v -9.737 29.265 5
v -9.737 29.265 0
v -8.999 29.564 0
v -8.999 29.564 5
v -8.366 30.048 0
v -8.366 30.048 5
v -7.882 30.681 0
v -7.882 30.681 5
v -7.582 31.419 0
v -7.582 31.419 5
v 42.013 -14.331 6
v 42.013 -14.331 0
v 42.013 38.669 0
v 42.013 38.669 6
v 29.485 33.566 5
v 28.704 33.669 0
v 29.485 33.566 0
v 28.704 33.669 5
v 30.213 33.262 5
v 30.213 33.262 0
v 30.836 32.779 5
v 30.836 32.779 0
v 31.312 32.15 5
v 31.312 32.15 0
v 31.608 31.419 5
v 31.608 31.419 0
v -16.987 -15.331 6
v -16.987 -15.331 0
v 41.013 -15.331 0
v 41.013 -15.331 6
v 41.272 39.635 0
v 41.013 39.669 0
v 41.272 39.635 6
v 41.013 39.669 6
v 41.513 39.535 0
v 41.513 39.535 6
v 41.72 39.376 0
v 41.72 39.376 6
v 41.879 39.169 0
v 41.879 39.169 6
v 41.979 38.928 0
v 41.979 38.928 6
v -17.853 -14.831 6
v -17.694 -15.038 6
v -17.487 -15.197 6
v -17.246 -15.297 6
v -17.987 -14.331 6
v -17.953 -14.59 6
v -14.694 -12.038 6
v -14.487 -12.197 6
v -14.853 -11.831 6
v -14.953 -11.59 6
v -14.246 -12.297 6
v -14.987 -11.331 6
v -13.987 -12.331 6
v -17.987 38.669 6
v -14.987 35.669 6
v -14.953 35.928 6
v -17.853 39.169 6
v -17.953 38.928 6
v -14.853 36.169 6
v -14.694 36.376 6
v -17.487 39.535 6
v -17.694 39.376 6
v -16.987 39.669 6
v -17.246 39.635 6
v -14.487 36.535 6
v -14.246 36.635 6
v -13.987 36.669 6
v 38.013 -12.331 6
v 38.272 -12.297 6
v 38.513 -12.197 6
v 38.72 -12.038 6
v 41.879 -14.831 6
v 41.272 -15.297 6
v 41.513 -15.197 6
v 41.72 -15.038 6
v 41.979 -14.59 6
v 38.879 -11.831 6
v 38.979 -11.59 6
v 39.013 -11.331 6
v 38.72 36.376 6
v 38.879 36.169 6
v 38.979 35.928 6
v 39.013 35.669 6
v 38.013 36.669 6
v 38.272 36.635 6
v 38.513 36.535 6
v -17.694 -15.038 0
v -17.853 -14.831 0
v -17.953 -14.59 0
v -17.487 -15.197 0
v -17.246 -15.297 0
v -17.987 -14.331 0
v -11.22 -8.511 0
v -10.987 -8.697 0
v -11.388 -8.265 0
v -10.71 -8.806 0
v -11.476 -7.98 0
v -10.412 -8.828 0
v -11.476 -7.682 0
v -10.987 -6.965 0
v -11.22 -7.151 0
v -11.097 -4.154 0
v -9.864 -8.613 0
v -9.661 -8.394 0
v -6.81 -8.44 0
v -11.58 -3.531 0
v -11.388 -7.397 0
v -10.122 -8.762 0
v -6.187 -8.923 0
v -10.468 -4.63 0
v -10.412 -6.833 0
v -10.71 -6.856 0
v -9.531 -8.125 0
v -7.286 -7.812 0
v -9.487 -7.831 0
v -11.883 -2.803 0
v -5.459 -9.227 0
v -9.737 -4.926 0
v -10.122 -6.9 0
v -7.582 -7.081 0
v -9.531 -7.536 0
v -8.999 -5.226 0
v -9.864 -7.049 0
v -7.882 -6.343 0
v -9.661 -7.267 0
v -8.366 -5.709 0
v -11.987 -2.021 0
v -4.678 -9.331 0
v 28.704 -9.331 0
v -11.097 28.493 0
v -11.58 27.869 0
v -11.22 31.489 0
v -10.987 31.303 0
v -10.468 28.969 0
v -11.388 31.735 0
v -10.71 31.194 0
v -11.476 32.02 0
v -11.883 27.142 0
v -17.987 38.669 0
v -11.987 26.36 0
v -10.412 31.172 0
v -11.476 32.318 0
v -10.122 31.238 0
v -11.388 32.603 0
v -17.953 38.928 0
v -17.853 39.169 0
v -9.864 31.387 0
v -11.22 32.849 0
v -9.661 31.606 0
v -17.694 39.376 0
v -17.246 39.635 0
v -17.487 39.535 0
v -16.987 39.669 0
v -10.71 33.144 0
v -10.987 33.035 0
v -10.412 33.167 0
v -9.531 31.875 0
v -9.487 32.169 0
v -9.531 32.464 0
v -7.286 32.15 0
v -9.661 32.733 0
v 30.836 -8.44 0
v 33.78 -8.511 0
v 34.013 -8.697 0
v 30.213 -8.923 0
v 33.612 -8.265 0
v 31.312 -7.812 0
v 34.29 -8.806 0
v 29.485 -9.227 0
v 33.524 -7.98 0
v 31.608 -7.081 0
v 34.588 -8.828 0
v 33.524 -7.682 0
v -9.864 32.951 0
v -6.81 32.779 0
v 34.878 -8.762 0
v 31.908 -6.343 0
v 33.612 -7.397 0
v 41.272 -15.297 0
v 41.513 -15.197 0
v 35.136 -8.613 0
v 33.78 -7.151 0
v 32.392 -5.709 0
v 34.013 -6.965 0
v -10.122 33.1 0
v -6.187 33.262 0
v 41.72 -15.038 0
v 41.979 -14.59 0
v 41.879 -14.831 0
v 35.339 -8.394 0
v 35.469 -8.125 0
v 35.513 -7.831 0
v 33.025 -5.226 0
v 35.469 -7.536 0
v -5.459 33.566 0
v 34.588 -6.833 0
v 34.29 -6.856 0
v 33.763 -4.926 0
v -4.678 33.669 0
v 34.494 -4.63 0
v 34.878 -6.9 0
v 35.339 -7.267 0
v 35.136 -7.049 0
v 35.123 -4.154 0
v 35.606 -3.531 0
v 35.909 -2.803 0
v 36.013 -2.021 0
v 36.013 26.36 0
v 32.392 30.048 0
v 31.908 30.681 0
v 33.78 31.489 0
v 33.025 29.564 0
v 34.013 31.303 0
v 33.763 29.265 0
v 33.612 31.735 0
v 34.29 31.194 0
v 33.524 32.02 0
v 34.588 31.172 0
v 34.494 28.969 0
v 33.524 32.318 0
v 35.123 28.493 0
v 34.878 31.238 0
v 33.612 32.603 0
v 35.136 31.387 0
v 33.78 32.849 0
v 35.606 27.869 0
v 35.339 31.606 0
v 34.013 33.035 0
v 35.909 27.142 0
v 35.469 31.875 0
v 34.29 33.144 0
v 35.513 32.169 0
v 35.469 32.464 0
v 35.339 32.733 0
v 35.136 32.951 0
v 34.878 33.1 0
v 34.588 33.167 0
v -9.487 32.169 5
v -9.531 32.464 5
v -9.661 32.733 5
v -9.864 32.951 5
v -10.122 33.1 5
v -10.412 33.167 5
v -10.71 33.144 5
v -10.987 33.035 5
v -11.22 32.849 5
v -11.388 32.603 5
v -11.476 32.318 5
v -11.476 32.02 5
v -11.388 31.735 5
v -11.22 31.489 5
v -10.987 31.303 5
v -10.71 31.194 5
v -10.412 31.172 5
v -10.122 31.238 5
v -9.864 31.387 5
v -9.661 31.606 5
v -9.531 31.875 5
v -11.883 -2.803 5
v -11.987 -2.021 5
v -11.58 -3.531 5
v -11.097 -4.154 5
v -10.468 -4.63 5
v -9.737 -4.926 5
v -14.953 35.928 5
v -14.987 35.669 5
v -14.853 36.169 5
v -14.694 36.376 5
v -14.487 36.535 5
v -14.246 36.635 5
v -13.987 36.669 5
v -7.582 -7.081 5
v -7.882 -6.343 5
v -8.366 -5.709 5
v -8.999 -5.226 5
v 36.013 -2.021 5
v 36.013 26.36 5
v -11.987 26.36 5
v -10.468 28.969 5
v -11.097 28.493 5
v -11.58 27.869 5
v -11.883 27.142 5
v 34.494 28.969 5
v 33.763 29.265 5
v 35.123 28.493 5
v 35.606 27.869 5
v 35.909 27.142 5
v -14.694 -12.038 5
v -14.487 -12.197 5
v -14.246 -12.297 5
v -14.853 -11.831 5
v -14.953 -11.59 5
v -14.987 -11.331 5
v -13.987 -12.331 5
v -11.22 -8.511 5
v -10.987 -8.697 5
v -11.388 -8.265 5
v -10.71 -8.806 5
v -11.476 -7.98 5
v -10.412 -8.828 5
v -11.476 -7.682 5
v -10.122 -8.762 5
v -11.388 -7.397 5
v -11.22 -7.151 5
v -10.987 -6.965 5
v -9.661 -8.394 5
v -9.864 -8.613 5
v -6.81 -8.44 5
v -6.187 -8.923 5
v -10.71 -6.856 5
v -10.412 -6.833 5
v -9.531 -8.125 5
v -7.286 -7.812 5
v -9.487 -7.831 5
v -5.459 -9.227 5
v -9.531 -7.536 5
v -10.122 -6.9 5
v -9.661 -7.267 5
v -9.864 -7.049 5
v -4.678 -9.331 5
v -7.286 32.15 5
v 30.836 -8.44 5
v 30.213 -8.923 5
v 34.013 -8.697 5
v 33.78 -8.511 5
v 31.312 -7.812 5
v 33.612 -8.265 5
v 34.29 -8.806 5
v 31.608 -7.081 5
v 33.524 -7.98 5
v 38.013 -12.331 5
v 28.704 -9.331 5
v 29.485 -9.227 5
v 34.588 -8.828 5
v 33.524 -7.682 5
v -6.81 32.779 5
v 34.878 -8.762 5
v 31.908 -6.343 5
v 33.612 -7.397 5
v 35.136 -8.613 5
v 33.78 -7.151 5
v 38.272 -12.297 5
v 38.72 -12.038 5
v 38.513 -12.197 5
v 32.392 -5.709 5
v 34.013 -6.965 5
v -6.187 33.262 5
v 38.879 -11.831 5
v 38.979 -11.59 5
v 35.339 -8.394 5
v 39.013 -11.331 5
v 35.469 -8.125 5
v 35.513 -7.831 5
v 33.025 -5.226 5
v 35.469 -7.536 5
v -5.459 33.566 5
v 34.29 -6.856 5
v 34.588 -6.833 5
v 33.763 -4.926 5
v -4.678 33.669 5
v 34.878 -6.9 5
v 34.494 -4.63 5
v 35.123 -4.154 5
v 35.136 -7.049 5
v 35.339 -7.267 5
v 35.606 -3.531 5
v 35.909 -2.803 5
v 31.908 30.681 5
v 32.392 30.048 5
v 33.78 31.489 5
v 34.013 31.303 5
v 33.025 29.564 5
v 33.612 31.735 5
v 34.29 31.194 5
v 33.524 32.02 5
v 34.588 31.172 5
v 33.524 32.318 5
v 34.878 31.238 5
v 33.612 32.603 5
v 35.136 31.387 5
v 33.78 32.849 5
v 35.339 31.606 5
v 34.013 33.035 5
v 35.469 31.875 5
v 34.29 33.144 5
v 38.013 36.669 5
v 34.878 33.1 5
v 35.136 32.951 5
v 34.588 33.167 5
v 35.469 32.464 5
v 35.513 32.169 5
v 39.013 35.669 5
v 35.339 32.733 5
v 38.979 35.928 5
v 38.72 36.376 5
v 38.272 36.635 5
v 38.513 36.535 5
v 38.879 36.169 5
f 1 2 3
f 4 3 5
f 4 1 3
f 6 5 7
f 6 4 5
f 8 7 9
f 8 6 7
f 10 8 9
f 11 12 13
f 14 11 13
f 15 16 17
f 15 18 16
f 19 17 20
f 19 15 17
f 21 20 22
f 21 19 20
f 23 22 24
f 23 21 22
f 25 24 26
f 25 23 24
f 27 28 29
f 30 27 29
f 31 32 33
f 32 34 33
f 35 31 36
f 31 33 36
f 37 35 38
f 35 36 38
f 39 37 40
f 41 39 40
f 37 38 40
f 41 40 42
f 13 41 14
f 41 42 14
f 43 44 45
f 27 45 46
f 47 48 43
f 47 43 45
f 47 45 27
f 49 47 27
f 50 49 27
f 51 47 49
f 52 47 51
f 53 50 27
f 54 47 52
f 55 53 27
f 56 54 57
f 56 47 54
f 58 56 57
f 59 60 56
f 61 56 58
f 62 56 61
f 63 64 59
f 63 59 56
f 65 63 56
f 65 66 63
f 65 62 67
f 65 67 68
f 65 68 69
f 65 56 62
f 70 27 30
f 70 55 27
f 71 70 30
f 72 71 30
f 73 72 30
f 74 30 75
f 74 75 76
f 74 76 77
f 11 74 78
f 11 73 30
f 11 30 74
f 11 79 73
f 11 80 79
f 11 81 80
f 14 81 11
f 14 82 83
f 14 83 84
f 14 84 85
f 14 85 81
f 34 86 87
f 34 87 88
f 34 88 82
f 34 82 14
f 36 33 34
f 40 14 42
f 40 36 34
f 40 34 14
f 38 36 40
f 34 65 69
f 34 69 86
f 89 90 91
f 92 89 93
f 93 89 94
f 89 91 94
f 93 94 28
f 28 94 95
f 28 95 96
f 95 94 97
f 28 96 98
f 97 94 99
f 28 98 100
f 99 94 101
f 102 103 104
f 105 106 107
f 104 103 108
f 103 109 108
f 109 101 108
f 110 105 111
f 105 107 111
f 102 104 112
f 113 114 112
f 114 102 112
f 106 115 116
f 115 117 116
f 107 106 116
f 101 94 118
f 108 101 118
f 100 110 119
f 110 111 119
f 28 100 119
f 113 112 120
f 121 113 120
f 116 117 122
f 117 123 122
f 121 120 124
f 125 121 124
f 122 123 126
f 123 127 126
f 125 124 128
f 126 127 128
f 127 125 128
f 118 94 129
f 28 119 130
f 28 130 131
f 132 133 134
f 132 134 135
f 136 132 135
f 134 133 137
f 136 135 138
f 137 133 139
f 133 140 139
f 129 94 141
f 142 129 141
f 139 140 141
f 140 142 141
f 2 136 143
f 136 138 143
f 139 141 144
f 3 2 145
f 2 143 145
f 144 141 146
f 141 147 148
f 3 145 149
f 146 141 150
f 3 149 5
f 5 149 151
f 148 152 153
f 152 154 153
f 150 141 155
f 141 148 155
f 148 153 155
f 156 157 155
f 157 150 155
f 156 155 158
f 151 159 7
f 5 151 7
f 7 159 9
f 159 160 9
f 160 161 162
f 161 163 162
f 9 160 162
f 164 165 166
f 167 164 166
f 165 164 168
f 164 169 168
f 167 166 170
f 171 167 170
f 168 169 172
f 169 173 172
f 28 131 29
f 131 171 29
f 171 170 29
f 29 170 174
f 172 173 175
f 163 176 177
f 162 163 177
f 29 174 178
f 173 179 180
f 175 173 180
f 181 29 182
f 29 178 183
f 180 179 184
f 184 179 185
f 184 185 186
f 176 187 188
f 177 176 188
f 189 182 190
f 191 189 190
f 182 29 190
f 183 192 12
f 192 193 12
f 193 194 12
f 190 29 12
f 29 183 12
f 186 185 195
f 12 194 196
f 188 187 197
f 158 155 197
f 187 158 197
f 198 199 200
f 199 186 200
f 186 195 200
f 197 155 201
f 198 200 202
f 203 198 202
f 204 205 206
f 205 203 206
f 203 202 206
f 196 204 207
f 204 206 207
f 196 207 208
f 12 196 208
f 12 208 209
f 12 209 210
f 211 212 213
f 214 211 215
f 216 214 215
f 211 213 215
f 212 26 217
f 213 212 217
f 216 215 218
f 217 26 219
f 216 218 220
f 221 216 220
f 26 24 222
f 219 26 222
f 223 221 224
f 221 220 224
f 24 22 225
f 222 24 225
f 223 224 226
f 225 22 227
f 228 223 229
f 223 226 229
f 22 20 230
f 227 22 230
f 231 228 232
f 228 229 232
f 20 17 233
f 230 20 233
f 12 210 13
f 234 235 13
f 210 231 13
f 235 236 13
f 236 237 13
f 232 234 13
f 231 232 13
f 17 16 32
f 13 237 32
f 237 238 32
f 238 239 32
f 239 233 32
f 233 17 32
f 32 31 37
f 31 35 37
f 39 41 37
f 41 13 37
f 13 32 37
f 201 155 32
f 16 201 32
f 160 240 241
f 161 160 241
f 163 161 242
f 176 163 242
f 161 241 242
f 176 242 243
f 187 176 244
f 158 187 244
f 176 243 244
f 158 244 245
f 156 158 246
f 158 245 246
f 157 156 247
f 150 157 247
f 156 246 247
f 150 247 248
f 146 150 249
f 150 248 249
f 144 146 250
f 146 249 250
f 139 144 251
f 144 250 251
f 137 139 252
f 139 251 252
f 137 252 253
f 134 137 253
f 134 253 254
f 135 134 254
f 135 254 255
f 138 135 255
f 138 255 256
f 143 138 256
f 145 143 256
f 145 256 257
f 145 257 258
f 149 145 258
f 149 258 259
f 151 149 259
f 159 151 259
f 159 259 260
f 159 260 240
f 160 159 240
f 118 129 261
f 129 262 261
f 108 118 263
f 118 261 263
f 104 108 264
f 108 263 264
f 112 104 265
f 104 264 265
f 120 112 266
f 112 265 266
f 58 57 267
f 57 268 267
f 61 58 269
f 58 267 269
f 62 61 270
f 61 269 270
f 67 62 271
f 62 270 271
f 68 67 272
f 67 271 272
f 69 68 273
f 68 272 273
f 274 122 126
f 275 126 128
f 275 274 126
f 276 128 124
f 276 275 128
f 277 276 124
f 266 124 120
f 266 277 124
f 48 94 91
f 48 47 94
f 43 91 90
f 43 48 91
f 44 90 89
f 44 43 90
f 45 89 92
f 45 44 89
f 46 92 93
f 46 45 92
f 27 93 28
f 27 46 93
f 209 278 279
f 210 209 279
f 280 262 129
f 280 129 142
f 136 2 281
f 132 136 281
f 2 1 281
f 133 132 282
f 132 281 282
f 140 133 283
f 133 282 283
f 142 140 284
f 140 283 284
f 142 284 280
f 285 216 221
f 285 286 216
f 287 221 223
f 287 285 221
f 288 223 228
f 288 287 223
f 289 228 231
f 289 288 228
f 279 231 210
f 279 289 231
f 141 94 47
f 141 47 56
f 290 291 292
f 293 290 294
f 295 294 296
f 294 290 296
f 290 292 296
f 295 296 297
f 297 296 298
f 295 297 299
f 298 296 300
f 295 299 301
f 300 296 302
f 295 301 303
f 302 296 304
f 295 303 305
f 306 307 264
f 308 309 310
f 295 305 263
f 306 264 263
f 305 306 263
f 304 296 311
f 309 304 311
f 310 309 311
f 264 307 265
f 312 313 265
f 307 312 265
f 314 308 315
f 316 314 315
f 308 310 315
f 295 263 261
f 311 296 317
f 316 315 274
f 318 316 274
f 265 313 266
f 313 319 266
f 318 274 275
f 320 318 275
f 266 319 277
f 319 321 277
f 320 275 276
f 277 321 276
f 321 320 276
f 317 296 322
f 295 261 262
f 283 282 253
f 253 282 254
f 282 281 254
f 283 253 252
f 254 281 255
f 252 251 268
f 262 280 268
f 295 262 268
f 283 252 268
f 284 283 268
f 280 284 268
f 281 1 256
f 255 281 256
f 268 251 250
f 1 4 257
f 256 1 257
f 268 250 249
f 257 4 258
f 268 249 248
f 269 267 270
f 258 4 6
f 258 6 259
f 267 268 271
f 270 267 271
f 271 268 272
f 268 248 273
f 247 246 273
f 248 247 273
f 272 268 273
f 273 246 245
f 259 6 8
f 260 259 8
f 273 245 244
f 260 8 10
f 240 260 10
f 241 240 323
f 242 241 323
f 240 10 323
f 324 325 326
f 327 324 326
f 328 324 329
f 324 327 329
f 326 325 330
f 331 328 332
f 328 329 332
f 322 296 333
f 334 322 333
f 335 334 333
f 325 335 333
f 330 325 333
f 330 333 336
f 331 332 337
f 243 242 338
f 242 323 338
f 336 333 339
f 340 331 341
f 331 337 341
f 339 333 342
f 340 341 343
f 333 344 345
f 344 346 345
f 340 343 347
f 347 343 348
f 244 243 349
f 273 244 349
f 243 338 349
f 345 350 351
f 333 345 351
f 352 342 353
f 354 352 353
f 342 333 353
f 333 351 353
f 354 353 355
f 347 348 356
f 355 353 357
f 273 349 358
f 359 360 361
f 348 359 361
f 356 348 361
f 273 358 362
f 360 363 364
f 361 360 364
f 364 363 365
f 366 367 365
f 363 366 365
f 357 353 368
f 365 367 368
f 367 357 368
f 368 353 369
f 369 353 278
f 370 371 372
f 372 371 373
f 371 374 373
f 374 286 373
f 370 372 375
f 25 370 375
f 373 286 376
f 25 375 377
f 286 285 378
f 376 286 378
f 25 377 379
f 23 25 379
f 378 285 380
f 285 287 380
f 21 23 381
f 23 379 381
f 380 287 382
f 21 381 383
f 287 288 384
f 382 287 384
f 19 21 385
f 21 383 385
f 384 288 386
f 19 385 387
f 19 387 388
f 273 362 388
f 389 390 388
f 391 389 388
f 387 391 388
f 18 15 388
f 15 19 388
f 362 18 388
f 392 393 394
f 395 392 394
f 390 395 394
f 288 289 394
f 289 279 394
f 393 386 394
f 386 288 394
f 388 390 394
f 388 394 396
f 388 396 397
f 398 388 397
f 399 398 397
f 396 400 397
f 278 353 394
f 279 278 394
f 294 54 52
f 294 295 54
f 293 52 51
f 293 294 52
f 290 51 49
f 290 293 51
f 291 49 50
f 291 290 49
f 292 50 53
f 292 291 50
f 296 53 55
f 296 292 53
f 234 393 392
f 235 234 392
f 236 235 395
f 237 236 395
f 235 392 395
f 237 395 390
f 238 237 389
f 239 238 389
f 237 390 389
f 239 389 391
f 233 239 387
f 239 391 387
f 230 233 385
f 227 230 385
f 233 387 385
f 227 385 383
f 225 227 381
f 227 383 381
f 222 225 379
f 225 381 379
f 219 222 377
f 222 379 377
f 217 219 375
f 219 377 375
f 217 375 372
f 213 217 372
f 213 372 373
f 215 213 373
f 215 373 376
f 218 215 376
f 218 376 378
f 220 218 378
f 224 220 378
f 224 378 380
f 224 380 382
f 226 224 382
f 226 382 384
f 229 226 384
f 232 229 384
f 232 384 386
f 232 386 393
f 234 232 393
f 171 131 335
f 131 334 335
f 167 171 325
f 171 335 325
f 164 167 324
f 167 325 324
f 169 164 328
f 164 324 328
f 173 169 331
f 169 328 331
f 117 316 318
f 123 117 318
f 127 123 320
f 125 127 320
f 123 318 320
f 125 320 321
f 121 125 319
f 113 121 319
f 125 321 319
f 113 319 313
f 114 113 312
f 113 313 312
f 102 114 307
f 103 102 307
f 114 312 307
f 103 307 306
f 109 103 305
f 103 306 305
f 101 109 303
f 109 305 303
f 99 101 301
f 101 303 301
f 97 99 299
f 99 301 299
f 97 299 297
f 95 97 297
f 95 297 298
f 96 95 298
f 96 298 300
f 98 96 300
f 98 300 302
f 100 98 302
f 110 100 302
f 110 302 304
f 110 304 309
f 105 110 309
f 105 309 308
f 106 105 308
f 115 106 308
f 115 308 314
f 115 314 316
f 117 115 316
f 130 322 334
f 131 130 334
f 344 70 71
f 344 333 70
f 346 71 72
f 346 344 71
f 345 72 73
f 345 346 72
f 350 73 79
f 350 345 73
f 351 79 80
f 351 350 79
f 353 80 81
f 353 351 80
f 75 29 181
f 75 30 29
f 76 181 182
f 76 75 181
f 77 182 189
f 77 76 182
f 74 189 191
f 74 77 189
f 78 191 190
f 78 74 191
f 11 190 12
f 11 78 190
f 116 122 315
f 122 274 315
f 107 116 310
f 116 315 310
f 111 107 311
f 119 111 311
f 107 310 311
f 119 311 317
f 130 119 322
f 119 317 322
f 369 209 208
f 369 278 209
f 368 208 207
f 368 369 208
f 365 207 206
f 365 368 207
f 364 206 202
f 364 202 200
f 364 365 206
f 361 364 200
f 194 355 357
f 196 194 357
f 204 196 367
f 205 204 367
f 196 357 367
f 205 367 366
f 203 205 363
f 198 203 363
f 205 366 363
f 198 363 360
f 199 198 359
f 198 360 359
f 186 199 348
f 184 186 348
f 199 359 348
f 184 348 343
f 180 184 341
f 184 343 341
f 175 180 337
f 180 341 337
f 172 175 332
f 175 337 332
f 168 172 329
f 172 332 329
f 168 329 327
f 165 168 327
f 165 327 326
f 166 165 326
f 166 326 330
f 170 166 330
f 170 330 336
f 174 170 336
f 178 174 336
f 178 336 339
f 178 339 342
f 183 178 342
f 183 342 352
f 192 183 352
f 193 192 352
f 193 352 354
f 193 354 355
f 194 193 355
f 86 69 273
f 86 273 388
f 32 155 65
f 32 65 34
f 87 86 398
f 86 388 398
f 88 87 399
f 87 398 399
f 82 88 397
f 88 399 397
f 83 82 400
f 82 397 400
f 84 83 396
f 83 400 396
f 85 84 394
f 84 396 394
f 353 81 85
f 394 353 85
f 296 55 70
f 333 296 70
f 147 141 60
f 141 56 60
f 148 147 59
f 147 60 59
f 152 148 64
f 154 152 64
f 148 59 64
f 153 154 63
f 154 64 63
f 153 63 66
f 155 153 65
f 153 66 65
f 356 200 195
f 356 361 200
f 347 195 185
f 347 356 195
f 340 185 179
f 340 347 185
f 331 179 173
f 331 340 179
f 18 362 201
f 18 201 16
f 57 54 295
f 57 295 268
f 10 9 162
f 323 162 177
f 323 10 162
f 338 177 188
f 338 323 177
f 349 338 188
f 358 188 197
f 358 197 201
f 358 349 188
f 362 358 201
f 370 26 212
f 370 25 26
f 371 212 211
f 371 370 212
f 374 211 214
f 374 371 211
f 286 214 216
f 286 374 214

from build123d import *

# Parameters (mm, degrees)
F0_W      = 60
F0_H      = 55
F1_DEPTH  = 6
F2_W      = 54
F2_H      = 49
F3_DEPTH  = 1
F4_W      = 48
F4_H      = 43
F5_DEPTH  = 25
F6_R      = 3
F7_DEPTH  = 6
F8_DEPTH  = 54
F9_R      = 1
F10_DEPTH = 25
F11_R     = 3
F12_R     = 1


with BuildPart() as f1:
    # F0 (on Top) → F1 (new body)
    with BuildSketch(Plane.XY):
        with Locations((12.012976855, 12.1693141837)):
            Rectangle(F0_W, F0_H)
    extrude(amount=F1_DEPTH)

    # F2 (on face) → F3 (cut)
    with BuildSketch(Plane.XY.offset(6)):
        with Locations((12.012976855, 12.1693141837)):
            Rectangle(F2_W, F2_H)
    extrude(amount=-F3_DEPTH, mode=Mode.SUBTRACT)

    # F4 (on face) → F5 (cut)
    with BuildSketch(Plane.XY.offset(5)):
        with Locations((12.012976855, 12.1693141837)):
            Rectangle(F4_W, F4_H)
    extrude(amount=-F5_DEPTH, mode=Mode.SUBTRACT)

    # F6 (on face) → F7 (join, through all)
    with BuildSketch(Plane.XY.offset(6)):
        with Locations((-10.487023145, 32.1693141837)):
            Circle(F6_R)
        with Locations((34.512976855, 32.1693141837)):
            Circle(F6_R)
        with Locations((34.512976855, -7.8306858163)):
            Circle(F6_R)
        with Locations((-10.487023145, -7.8306858163)):
            Circle(F6_R)
    extrude(amount=-F7_DEPTH)

    # F8 (cut, through all): a face of the model
    f8_faces = [f1.faces().sort_by_distance(p)[0] for p in [
        (39.012976855, 12.1693141837, 5.5),
    ]]
    extrude(f8_faces, amount=F8_DEPTH, mode=Mode.SUBTRACT)

    # F9 (on face) → F10 (cut)
    with BuildSketch(Plane.XY.offset(6)):
        with Locations((-10.487023145, -7.8306858163)):
            Circle(F9_R)
        with Locations((34.512976855, -7.8306858163)):
            Circle(F9_R)
        with Locations((34.512976855, 32.1693141837)):
            Circle(F9_R)
        with Locations((-10.487023145, 32.1693141837)):
            Circle(F9_R)
    extrude(amount=-F10_DEPTH, mode=Mode.SUBTRACT)

    # F11
    f11_edges = [f1.edges().sort_by_distance(p)[0] for p in [
        (-7.888947, 33.669314, 2.5),
        (-11.987023, 29.571238, 2.5),
        (36.012977, 29.571238, 2.5),
        (31.914901, 33.669314, 2.5),
        (36.012977, -5.23261, 2.5),
        (31.914901, -9.330686, 2.5),
        (-11.987023, -5.23261, 2.5),
        (-7.888947, -9.330686, 2.5),
    ]]
    fillet(f11_edges, radius=F11_R)

    # F12
    f12_edges = [f1.edges().sort_by_distance(p)[0] for p in [
        (-17.987023, -15.330686, 3),
        (-17.987023, 39.669314, 3),
        (42.012977, 39.669314, 3),
        (42.012977, -15.330686, 3),
        (39.012977, 36.669314, 5.5),
        (-14.987023, 36.669314, 5.5),
        (-14.987023, -12.330686, 5.5),
        (39.012977, -12.330686, 5.5),
    ]]
    fillet(f12_edges, radius=F12_R)


solid = f1.part
